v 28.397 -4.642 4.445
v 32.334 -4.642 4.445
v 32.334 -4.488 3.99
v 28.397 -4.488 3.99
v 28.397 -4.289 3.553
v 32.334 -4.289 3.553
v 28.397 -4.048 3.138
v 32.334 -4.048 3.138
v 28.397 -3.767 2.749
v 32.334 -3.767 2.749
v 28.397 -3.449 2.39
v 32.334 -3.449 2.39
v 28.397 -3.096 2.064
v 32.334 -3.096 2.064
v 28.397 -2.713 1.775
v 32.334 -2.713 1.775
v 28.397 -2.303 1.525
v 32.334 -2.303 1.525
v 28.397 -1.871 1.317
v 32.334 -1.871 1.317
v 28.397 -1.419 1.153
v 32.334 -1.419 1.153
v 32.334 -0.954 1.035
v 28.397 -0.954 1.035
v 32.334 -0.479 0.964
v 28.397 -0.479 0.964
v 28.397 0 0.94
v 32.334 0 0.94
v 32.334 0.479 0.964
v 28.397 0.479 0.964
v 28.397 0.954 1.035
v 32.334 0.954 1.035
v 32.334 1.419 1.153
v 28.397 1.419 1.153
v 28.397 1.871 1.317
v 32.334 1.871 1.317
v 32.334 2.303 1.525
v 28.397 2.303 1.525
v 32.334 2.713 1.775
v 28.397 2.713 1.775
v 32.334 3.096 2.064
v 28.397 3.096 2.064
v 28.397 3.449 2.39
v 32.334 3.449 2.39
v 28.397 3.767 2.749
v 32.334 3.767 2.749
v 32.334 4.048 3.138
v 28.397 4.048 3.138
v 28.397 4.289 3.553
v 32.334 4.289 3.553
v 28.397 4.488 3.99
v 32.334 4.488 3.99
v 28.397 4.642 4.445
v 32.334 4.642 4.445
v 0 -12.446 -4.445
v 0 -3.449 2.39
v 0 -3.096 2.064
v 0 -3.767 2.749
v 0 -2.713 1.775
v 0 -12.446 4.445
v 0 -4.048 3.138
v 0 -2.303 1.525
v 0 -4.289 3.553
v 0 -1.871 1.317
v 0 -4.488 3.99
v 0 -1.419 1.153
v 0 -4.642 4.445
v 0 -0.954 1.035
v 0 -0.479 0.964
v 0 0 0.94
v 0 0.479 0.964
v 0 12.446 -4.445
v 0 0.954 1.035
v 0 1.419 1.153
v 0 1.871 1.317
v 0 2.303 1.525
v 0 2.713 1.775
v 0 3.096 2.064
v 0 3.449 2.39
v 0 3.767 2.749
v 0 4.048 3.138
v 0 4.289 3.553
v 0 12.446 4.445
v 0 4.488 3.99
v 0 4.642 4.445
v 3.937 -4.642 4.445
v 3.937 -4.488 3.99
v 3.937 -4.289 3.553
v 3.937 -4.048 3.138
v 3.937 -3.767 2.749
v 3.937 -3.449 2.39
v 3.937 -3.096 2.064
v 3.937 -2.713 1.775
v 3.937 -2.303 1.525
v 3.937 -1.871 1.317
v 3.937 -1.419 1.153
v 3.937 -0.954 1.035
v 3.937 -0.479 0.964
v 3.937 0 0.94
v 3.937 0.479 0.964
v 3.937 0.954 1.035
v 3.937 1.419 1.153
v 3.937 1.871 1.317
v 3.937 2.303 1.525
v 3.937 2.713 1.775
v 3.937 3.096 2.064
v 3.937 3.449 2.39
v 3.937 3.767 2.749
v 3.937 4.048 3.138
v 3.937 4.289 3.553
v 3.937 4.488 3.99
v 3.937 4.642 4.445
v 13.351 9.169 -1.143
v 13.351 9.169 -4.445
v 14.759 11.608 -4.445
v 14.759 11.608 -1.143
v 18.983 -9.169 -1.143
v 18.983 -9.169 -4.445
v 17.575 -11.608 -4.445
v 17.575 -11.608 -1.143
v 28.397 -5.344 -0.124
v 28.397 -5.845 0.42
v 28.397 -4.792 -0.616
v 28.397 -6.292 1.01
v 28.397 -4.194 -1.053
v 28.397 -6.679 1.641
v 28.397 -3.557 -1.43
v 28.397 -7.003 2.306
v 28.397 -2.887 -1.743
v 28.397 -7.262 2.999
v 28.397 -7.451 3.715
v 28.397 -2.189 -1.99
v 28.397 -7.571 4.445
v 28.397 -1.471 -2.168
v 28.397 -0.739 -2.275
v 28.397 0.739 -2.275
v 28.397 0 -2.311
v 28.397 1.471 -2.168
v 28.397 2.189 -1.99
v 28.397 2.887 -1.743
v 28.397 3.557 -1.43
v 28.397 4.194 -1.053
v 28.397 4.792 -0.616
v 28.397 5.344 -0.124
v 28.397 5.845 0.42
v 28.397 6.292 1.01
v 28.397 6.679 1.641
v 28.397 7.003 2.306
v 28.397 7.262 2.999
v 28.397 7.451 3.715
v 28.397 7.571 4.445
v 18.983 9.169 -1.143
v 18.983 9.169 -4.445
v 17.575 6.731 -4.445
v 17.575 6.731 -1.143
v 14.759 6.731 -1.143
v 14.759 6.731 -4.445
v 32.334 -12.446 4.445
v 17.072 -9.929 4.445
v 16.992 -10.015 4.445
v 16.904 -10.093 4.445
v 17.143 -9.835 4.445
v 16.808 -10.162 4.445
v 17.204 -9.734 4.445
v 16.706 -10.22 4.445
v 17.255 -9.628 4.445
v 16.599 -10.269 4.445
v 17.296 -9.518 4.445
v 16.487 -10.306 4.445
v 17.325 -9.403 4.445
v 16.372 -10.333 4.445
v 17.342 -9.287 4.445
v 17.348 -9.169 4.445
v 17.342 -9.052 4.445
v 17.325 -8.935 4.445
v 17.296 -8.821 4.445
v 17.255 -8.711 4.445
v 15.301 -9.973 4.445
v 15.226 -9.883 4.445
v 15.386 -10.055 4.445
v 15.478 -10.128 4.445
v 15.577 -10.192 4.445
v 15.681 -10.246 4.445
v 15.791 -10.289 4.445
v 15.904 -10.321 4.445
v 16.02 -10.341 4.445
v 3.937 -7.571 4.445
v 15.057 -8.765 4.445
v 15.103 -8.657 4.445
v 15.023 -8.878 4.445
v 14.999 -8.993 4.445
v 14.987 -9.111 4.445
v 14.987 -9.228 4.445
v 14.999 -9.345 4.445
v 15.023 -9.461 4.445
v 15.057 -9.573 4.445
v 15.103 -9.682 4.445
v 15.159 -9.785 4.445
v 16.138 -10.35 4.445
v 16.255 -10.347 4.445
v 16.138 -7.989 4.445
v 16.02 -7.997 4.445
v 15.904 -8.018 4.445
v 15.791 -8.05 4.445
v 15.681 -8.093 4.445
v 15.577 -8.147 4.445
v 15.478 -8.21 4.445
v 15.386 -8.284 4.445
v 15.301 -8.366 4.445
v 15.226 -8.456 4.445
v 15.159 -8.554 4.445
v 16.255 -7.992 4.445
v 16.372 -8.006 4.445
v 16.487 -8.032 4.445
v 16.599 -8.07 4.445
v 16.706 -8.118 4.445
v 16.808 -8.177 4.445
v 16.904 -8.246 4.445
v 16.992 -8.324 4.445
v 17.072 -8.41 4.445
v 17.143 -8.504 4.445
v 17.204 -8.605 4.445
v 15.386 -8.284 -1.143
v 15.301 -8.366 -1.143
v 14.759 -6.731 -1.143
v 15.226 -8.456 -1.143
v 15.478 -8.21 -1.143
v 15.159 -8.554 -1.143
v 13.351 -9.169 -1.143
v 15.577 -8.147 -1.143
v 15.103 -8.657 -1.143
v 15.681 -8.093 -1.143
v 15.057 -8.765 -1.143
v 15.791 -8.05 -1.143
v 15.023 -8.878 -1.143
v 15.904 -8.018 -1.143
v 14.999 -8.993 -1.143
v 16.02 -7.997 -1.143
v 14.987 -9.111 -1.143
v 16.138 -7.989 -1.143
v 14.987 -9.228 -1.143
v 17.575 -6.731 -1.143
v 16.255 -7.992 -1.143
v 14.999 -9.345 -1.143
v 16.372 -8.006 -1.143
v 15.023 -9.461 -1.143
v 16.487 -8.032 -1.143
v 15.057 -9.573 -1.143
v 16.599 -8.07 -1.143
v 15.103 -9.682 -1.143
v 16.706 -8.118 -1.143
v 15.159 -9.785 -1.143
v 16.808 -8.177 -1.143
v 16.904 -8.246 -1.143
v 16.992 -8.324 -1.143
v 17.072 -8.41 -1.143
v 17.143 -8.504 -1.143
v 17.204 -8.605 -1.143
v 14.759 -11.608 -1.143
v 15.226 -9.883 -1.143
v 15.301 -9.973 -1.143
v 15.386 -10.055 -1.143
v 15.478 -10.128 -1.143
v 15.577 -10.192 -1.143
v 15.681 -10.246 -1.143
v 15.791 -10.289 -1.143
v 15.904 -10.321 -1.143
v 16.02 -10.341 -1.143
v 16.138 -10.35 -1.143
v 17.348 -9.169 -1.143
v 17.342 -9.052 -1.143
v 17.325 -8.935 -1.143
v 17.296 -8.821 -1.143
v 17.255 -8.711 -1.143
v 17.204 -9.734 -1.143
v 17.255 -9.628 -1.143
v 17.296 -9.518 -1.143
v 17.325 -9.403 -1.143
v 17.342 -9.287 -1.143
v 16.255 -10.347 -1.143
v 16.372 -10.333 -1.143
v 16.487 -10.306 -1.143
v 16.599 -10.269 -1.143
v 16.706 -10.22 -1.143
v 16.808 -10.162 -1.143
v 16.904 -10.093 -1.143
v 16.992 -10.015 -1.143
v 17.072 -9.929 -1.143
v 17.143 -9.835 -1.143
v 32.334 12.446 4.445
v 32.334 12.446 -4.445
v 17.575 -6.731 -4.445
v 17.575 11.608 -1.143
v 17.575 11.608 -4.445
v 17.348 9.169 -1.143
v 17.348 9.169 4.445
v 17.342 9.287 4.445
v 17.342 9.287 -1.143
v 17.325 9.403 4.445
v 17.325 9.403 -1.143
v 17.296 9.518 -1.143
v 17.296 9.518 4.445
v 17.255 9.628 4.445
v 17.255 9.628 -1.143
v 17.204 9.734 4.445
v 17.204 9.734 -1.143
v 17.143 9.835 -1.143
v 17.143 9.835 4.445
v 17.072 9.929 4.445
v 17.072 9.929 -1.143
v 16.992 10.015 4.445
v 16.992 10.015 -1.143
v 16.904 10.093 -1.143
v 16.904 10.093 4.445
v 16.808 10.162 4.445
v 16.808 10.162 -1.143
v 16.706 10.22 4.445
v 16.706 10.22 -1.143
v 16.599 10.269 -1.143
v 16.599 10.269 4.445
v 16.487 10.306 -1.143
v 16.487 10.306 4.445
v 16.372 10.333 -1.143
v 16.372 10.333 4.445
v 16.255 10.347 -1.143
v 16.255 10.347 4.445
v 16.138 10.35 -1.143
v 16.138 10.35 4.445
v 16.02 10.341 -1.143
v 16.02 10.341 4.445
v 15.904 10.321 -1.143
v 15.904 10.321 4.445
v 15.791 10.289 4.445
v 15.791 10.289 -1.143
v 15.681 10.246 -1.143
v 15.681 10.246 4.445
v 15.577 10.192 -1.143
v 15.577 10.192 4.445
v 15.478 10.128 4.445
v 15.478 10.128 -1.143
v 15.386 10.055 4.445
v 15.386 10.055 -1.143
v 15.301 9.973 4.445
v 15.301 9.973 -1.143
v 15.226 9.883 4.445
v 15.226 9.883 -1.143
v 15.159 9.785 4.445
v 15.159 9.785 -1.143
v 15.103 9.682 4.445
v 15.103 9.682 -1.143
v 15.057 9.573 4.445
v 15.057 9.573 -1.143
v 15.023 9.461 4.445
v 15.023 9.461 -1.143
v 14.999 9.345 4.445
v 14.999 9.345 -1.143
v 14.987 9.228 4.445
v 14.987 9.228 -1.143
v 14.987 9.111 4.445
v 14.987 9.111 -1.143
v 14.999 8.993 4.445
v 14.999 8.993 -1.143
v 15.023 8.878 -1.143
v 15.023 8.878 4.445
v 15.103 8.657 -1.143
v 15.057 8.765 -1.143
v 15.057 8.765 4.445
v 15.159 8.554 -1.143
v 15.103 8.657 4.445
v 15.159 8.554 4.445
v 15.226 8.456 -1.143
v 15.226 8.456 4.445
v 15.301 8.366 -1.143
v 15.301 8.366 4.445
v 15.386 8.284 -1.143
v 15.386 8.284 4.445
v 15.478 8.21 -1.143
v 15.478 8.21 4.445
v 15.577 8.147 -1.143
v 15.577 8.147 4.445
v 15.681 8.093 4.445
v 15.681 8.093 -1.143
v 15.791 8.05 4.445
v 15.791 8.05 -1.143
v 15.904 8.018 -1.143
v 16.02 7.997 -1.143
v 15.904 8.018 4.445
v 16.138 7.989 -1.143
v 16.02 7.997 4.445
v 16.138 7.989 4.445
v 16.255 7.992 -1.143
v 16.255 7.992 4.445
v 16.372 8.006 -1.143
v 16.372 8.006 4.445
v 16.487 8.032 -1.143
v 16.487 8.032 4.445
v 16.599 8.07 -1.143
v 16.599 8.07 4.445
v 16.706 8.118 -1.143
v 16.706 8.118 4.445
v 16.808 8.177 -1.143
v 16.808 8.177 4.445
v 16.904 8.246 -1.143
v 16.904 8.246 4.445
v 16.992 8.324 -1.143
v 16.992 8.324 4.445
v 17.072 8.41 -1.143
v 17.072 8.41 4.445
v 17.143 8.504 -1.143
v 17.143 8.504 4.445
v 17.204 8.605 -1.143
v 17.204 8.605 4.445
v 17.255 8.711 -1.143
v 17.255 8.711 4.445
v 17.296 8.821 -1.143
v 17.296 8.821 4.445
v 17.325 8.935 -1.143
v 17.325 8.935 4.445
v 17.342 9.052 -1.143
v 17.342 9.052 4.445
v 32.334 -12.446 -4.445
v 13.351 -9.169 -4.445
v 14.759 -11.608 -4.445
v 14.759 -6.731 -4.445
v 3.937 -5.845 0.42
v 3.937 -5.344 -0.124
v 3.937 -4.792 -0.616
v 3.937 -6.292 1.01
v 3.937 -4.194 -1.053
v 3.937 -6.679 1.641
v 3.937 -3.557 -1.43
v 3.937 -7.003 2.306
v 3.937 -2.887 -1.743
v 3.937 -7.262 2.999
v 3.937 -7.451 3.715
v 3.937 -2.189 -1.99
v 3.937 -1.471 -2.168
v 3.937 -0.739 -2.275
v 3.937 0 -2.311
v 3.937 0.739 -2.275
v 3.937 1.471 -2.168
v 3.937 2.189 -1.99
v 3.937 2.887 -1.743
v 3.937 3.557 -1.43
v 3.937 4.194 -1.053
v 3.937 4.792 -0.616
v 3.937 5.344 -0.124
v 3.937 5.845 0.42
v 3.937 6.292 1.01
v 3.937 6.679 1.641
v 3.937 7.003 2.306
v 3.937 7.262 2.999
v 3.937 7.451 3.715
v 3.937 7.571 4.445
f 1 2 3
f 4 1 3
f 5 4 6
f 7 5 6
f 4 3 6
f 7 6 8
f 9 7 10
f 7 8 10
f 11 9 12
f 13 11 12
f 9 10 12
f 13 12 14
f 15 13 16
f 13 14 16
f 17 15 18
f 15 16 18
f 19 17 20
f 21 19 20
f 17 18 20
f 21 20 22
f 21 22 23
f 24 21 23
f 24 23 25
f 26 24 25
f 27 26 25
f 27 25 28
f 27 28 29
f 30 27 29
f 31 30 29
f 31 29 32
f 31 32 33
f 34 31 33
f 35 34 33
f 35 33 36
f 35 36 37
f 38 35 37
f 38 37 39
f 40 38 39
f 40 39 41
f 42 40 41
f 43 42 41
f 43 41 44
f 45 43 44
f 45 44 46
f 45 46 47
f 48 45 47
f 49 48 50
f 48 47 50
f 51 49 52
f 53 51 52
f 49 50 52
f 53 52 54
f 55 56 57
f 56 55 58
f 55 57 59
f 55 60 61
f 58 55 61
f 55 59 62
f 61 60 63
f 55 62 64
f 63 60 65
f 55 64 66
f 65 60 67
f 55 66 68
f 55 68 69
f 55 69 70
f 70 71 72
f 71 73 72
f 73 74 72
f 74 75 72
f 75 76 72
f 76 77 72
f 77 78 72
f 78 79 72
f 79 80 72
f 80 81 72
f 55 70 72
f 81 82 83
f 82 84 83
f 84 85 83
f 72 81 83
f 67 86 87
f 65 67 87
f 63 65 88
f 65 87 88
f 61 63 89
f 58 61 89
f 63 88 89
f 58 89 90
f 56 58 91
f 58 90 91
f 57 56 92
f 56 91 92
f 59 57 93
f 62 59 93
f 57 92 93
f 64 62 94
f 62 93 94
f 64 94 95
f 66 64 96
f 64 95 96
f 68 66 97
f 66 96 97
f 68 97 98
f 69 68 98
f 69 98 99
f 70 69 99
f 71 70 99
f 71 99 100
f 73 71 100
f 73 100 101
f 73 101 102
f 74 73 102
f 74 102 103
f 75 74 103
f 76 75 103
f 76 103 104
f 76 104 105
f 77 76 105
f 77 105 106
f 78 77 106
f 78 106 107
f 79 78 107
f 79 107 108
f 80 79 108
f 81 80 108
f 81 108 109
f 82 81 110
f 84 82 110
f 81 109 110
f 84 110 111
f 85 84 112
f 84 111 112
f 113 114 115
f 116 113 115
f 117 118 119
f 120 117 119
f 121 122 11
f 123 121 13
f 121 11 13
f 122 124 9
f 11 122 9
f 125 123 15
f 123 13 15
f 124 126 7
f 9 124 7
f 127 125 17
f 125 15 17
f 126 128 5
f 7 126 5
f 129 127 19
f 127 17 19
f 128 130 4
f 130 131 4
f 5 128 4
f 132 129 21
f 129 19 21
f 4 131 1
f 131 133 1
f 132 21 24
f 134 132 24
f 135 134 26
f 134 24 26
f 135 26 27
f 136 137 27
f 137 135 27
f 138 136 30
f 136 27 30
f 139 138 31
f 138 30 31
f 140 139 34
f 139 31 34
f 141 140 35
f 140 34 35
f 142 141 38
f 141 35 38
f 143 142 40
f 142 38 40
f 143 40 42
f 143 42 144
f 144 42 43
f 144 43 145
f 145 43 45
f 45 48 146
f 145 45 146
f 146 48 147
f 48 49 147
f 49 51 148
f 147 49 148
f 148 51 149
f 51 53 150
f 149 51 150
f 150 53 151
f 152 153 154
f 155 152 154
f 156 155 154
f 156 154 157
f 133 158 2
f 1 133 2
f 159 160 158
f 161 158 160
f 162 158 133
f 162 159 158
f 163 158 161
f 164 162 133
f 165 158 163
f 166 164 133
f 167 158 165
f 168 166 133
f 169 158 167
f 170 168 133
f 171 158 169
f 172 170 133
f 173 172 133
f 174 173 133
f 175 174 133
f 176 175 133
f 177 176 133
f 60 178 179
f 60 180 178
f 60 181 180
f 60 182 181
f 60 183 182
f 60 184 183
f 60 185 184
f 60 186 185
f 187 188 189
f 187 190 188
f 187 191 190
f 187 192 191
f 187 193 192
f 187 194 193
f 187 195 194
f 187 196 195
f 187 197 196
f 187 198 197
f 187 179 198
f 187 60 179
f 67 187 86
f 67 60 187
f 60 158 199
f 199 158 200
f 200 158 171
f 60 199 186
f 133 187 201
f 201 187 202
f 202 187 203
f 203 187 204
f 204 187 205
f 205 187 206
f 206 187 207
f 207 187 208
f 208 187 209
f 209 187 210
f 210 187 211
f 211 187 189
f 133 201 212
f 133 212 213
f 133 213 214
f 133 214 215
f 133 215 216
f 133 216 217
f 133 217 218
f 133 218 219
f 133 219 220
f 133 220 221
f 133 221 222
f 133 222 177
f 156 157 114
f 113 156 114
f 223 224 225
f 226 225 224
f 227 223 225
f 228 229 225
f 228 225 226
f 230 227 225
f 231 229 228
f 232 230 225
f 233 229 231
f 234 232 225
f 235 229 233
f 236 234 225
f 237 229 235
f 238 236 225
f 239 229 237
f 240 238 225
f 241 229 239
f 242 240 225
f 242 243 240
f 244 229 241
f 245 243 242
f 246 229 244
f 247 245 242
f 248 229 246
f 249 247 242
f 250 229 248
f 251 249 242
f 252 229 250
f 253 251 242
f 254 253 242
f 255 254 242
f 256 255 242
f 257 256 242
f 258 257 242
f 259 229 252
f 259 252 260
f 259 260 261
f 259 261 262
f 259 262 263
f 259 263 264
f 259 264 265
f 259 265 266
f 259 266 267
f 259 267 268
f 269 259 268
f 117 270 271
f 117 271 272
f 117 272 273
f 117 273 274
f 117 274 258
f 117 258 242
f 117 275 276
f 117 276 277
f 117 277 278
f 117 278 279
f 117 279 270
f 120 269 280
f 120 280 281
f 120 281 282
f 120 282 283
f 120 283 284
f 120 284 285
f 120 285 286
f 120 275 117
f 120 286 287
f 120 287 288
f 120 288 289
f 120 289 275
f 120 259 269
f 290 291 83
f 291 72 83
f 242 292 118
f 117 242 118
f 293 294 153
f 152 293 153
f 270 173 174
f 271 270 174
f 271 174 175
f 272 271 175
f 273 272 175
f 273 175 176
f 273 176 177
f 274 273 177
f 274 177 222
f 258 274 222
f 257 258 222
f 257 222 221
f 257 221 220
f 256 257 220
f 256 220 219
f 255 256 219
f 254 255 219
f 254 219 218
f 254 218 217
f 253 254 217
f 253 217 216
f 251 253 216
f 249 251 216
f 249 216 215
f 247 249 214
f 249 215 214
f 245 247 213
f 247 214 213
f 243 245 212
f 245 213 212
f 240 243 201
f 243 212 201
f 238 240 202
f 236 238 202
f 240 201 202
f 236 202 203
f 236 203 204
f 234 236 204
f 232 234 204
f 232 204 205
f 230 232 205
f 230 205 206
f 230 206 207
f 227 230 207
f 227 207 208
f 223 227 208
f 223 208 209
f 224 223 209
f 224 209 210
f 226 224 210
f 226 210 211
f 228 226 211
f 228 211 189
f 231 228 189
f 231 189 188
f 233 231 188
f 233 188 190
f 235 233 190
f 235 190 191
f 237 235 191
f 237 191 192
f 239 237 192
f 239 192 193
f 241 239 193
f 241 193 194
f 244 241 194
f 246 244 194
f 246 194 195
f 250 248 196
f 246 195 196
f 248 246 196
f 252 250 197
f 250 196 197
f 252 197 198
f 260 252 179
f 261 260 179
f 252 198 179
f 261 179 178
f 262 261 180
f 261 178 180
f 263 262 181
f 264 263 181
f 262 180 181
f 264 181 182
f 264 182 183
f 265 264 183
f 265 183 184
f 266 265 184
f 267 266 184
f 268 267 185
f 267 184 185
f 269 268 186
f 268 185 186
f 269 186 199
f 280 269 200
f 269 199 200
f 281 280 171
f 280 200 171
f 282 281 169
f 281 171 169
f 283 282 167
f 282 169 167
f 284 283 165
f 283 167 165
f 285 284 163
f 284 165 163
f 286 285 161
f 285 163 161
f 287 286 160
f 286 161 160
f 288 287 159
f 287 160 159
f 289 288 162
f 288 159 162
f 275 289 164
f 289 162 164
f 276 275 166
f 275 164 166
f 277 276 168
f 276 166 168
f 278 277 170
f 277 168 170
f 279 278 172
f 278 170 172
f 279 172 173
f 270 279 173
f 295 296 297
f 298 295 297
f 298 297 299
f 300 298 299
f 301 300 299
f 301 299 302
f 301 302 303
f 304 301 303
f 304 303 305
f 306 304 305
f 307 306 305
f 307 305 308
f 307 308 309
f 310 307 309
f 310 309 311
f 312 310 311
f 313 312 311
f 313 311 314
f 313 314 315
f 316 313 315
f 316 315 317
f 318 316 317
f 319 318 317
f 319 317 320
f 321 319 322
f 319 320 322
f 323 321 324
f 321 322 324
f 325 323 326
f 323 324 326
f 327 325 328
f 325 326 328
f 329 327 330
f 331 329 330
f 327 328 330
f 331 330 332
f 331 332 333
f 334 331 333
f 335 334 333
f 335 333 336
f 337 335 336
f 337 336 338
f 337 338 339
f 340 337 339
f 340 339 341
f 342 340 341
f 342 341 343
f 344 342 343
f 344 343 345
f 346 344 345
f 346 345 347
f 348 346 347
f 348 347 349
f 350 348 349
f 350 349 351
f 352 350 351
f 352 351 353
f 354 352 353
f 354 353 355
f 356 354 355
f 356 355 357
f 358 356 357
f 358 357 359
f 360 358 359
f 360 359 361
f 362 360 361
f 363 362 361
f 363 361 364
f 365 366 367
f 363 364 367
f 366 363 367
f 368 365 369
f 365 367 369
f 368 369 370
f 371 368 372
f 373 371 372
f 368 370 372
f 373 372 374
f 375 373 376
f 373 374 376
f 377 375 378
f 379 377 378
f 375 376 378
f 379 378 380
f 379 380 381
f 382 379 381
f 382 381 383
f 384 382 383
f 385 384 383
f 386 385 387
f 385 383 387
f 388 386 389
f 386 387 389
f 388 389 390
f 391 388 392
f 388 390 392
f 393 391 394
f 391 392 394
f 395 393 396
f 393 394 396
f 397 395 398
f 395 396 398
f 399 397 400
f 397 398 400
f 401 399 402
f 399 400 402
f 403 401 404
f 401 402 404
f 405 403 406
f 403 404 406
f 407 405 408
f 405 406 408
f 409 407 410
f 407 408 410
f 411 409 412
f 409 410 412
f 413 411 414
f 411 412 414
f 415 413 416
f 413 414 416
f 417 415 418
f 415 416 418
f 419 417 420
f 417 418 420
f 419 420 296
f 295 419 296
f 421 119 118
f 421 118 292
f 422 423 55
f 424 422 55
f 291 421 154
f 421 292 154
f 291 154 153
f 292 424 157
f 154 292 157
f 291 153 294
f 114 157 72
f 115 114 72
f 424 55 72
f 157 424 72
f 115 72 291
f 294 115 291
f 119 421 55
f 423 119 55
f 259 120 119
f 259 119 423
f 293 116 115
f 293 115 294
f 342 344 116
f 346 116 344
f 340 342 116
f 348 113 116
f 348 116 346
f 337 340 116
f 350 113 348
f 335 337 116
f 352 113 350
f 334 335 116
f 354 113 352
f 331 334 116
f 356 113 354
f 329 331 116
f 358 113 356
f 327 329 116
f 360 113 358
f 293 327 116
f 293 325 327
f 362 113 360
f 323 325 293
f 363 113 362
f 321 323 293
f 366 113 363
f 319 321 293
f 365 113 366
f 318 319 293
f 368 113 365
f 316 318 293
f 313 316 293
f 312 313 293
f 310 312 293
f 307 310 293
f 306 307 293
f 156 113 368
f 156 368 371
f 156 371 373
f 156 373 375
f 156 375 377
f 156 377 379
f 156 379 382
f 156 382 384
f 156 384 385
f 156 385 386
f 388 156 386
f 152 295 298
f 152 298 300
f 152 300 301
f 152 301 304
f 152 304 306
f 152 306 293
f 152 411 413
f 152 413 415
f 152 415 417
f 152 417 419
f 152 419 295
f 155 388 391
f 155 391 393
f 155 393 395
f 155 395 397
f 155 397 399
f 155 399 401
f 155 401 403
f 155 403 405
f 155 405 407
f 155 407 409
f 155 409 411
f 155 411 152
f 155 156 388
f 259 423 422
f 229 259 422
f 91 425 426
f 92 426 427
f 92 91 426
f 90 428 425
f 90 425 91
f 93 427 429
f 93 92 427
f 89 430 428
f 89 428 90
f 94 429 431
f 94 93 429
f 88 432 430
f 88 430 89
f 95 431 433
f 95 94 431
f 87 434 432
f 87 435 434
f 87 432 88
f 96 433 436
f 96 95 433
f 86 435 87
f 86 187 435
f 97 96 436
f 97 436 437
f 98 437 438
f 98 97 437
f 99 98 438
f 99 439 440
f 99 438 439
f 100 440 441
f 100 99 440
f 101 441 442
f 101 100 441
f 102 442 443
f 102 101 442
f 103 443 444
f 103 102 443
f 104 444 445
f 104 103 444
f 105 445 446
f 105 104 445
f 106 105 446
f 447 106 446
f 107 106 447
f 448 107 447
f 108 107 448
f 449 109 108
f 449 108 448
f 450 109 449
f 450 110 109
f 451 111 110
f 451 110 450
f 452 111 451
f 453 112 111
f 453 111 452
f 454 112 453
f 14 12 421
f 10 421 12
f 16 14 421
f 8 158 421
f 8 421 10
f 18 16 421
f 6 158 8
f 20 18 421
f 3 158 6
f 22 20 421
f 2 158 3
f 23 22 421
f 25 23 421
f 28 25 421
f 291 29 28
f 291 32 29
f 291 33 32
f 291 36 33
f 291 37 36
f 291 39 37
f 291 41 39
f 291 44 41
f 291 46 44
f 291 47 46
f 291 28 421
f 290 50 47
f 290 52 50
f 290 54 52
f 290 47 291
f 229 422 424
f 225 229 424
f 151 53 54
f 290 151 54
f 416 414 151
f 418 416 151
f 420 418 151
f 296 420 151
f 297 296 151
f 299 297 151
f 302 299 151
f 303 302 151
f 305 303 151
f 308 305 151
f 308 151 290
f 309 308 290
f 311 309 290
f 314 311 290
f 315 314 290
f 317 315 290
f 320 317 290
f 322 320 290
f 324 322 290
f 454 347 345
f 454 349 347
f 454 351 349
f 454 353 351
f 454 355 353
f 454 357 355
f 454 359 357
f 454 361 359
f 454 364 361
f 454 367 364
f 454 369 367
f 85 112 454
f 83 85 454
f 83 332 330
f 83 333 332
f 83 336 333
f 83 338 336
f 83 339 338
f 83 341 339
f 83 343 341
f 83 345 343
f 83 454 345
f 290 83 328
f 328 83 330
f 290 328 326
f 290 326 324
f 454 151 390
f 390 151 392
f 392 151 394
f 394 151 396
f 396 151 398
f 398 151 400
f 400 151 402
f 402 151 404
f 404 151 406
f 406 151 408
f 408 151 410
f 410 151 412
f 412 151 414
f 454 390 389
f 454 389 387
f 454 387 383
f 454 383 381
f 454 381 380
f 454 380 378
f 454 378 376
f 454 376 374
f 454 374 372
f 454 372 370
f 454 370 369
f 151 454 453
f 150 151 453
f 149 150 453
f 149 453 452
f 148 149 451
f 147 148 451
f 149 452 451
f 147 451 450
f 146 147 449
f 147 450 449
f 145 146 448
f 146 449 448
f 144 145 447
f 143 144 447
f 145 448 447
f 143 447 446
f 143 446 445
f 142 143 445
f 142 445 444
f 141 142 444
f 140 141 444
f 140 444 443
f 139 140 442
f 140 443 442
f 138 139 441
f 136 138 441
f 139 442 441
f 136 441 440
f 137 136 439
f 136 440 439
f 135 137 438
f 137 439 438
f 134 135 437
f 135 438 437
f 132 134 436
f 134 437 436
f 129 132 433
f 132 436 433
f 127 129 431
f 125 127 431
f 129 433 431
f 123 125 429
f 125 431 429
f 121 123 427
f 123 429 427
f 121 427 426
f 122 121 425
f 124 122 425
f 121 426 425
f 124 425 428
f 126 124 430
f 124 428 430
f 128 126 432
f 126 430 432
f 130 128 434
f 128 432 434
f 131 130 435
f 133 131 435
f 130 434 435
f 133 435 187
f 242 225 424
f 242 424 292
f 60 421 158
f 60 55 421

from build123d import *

# Parameters (mm, degrees)
F0_W      = 24.892
F0_H      = 8.89
F1_DEPTH  = 3.937
F3_DEPTH  = 24.4602
F4_W      = 24.892
F4_H      = 8.89
F5_DEPTH  = 3.937
F7_DEPTH  = 32.3352
F8_R      = 1.1811
F9_DEPTH  = 8.891
F11_DEPTH = 3.302


with BuildPart() as f1:
    # F0 (on Right) → F1 (new body)
    with BuildSketch(Plane.YZ):
        Rectangle(F0_W, F0_H)
    extrude(amount=F1_DEPTH)

    # F2 (on face) → F3 (join)
    with BuildSketch(Plane.YZ.offset(3.937)):
        with BuildLine():
            Line((-7.5709045061, 4.445), (-12.446, 4.445))
            Line((-12.446, 4.445), (-12.446, -4.445))
            Line((-12.446, -4.445), (12.446, -4.445))
            Line((12.446, -4.445), (12.446, 4.445))
            Line((12.446, 4.445), (7.5709045061, 4.445))
            ThreePointArc((7.5709045061, 4.445), (0, -2.3114), (-7.5709045061, 4.445))
        make_face()
    extrude(amount=F3_DEPTH)

    # F4 (on face) → F5 (join)
    with BuildSketch(Plane.YZ.offset(28.3972)):
        Rectangle(F4_W, F4_H)
    extrude(amount=F5_DEPTH)

    # F6 (on face) → F7 (cut, through all)
    with BuildSketch(Plane.YZ.offset(32.3342)):
        with BuildLine():
            Line((4.6417414146, 4.445), (-4.6417414146, 4.445))
            ThreePointArc((-4.6417414146, 4.445), (0, 0.9398), (4.6417414146, 4.445))
        make_face()
    extrude(amount=-F7_DEPTH, mode=Mode.SUBTRACT)

    # F8 (on face) → F9 (cut, through all)
    with BuildSketch(Plane.XY.offset(4.445)):
        with Locations((16.1671, -9.1694)):
            Circle(F8_R)
        with Locations((16.1671, 9.1694)):
            Circle(F8_R)
    extrude(amount=-F9_DEPTH, mode=Mode.SUBTRACT)

    # F10 (on face) → F11 (cut)
    with BuildSketch(Plane(origin=(0, 0, -4.445), x_dir=(1, 0, 0), z_dir=(0, 0, -1))):
        Polygon((14.7592891036, -6.731), (13.3514782072, -9.1694), (14.7592891036, -11.6078), (17.5749108964, -11.6078), (18.9827217928, -9.1694), (17.5749108964, -6.731), align=None)
        Polygon((13.3514782072, 9.1694), (14.7592891036, 6.731), (17.5749108964, 6.731), (18.9827217928, 9.1694), (17.5749108964, 11.6078), (14.7592891036, 11.6078), align=None)
    extrude(amount=-F11_DEPTH, mode=Mode.SUBTRACT)


solid = f1.part
